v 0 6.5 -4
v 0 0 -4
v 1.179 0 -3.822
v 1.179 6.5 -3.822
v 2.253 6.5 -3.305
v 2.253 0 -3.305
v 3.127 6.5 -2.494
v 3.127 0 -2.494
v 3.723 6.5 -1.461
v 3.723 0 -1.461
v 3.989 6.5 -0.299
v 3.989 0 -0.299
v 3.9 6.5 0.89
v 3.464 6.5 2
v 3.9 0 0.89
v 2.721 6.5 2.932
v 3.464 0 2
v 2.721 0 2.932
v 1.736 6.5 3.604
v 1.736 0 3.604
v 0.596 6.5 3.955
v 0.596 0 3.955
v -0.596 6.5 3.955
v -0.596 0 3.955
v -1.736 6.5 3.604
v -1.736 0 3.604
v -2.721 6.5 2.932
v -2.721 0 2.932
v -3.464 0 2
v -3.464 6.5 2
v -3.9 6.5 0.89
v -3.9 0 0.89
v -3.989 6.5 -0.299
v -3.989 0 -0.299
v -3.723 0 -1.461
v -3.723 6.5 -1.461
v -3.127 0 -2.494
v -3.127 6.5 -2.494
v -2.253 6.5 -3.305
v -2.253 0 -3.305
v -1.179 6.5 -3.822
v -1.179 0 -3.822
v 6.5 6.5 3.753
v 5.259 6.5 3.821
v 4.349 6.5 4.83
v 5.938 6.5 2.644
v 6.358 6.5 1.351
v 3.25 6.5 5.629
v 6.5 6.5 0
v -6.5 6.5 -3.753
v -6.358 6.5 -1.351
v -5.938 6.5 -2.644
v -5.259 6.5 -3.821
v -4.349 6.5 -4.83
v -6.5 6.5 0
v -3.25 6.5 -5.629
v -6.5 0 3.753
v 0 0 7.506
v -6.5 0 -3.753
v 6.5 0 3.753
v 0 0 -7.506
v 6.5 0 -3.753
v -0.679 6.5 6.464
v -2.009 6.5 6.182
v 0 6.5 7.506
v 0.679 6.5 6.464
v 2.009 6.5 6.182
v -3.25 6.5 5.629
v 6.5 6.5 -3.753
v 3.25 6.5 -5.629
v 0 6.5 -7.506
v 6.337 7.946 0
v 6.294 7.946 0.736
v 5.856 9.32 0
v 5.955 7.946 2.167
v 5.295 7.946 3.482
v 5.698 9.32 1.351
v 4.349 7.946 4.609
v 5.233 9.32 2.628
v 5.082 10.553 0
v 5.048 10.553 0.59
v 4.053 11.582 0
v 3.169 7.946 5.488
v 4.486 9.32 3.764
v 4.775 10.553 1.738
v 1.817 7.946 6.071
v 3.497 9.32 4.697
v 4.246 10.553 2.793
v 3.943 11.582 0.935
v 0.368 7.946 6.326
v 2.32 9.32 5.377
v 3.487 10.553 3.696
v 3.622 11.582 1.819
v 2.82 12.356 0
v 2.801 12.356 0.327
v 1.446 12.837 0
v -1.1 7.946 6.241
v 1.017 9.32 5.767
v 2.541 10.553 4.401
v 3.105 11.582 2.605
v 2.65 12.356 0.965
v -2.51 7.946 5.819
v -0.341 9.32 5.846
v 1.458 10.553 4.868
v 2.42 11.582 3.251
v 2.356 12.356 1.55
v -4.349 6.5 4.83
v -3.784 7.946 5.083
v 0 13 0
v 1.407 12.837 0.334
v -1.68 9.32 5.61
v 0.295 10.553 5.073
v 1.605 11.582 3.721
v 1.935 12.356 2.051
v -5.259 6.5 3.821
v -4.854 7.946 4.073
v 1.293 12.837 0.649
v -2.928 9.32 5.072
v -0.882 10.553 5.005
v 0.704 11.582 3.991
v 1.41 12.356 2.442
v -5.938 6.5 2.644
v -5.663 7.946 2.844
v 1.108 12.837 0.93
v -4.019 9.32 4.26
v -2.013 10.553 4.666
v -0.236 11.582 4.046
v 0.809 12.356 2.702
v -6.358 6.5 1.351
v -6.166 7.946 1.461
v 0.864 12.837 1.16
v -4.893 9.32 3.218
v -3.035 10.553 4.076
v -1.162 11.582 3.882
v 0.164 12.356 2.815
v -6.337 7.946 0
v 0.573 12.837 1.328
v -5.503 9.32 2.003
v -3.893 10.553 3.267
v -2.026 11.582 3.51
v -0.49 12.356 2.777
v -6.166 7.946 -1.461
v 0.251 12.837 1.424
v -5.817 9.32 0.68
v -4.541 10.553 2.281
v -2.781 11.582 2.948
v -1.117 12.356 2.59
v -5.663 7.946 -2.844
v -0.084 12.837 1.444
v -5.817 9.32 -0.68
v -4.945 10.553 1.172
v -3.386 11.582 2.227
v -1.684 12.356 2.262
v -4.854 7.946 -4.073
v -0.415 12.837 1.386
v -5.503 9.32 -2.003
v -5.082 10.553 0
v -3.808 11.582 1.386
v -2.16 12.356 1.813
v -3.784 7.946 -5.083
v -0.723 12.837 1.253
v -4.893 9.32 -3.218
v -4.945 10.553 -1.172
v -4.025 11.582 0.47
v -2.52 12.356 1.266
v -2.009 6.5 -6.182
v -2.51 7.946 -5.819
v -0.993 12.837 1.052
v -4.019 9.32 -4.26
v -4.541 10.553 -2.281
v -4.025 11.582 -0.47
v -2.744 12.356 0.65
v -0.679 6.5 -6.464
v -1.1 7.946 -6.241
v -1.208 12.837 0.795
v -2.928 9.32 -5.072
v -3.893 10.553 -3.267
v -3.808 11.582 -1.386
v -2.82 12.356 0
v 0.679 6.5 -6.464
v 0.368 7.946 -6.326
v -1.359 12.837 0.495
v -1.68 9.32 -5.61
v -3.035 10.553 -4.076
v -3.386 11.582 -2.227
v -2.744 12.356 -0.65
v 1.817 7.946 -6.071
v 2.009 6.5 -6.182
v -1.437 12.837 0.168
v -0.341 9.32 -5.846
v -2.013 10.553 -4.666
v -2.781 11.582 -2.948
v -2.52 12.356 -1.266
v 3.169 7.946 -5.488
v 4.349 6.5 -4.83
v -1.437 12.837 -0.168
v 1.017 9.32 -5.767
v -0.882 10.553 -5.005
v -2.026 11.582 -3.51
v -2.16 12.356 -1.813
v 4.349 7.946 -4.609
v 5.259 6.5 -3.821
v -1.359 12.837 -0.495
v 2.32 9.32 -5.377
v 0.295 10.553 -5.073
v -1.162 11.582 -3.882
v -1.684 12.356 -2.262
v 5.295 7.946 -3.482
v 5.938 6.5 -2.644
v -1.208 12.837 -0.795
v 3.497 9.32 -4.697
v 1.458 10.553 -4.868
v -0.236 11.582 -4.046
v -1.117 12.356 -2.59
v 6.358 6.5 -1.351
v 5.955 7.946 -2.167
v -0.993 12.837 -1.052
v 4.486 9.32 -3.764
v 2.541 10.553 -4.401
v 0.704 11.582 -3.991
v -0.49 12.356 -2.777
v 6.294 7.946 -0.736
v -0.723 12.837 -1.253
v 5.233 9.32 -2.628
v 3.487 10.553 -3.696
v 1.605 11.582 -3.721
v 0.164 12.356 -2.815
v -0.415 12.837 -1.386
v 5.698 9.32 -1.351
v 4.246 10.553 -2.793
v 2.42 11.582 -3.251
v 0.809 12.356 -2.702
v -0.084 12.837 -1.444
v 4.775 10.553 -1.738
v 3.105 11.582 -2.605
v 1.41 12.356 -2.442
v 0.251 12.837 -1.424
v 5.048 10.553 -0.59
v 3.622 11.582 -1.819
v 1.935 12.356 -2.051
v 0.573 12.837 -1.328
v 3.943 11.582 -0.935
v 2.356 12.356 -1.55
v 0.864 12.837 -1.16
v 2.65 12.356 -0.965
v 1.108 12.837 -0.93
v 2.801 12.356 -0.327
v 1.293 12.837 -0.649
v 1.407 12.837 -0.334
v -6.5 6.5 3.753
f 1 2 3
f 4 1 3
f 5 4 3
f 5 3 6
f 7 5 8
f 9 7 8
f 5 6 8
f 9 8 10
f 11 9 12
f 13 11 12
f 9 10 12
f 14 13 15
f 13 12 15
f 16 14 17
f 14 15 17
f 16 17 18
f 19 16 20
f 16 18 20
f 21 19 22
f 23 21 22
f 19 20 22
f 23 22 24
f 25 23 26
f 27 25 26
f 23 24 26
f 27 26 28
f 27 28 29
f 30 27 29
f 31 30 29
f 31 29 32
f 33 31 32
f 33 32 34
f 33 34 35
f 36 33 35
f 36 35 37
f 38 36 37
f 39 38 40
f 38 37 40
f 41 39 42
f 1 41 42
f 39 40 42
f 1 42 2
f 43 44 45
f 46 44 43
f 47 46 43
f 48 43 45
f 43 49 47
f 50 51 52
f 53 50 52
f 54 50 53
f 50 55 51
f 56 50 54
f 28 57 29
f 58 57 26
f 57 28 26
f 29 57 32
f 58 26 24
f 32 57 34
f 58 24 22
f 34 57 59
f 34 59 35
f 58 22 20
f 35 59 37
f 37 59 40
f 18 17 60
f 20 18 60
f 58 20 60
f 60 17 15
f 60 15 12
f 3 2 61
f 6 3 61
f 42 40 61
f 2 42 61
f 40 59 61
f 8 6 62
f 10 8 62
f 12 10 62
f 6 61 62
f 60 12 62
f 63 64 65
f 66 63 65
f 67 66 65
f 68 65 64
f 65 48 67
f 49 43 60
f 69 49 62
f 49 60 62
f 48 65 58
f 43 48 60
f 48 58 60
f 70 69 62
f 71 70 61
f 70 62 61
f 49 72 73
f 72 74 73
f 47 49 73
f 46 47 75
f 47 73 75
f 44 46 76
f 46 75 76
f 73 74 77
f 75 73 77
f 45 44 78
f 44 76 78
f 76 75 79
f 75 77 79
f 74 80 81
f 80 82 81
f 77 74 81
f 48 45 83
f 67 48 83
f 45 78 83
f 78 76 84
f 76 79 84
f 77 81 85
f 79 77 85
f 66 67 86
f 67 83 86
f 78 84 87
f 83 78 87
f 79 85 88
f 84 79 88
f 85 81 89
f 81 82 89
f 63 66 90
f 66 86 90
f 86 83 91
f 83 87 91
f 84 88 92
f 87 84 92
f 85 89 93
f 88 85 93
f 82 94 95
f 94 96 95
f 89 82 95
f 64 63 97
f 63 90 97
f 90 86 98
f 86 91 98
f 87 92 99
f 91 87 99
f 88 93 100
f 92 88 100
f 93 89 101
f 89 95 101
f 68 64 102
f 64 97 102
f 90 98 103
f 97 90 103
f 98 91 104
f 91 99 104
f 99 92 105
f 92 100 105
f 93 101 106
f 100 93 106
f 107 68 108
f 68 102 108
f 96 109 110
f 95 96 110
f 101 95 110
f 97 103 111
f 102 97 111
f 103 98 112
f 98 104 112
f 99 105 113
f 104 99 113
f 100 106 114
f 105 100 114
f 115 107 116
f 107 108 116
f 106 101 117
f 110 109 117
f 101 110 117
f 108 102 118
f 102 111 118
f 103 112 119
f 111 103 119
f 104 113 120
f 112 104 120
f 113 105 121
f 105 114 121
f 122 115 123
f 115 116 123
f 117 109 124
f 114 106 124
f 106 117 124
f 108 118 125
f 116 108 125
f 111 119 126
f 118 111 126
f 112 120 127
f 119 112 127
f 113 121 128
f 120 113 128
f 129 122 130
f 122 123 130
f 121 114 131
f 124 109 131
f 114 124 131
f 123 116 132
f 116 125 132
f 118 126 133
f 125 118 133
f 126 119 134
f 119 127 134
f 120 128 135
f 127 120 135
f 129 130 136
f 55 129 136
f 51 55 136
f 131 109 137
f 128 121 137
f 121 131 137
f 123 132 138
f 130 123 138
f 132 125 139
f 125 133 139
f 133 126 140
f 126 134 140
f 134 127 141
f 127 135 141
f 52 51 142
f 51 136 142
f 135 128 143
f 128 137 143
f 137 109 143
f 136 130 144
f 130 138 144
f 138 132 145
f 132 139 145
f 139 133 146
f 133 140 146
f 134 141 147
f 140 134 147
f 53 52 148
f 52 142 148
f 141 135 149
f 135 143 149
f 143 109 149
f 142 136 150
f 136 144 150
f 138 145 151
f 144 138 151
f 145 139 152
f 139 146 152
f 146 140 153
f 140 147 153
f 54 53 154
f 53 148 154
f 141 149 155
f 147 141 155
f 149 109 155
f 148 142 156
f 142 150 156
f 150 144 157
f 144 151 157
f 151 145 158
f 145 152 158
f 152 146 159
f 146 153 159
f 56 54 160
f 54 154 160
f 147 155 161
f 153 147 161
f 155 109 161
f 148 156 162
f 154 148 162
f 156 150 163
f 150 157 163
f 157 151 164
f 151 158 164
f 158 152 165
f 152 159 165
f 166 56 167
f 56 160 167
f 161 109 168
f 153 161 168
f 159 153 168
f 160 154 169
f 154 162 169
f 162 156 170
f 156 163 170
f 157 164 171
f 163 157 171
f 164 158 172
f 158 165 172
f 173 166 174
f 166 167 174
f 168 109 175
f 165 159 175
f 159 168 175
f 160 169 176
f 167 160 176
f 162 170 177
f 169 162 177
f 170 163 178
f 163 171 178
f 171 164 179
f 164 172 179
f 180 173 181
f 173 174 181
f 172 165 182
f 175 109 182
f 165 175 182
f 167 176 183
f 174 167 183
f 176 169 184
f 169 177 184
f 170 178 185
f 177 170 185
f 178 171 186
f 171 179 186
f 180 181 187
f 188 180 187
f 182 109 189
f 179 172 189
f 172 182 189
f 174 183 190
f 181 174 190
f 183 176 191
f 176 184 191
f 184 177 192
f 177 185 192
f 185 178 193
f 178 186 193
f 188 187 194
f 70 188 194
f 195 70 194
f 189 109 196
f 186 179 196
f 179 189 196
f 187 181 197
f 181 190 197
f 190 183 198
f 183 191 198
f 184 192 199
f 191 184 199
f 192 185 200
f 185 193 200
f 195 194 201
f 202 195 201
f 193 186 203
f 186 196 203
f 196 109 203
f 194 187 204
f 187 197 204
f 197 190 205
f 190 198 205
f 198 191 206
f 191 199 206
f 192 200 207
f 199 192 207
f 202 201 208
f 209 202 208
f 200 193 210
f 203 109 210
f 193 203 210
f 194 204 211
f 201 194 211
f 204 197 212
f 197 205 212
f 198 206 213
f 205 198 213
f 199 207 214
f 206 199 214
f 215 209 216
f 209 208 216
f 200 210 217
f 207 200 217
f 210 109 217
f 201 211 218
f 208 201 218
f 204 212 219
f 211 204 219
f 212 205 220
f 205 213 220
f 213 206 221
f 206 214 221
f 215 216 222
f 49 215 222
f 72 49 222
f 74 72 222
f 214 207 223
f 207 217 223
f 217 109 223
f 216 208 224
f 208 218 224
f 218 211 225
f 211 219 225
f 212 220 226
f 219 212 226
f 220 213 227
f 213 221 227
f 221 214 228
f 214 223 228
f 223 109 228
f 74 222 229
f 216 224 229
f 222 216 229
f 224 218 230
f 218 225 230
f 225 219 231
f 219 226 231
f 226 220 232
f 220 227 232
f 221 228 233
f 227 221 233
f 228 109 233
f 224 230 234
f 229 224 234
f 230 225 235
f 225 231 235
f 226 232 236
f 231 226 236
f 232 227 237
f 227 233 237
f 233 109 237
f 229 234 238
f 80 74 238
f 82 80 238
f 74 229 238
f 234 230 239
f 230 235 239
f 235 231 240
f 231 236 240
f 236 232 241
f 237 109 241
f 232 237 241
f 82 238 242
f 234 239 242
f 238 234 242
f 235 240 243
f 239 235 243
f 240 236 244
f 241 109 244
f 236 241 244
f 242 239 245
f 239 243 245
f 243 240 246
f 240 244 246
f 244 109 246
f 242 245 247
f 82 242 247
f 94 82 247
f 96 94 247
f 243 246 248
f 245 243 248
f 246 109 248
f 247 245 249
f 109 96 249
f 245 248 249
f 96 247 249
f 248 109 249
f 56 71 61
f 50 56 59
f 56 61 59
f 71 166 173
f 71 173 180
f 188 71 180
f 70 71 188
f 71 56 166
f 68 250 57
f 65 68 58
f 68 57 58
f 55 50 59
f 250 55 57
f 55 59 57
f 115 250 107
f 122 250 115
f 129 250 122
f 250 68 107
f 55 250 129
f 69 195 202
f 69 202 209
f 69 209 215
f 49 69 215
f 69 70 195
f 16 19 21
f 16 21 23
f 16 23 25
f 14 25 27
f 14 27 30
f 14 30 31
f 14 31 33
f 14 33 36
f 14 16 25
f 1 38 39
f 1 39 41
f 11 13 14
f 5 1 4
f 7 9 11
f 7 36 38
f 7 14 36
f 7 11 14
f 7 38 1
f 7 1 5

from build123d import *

# Parameters (mm, degrees)
EXTRUDE_1_DEPTH     = 6.5
SKETCH_6_R          = 4
CUT_EXTRUDE_1_DEPTH = 6.5


with BuildPart() as part:
    # ｽｹｯﾁ1 → ﾎﾞｽ - 押し出し1 (new body)
    with BuildSketch(Plane(origin=(0, 0, 0), x_dir=(1, 0, 0), z_dir=(0, 1, 0))):
        Polygon((0, -7.505553499), (6.5, -3.75277675), (6.5, 3.75277675), (0, 7.505553499), (-6.5, 3.75277675), (-6.5, -3.75277675), align=None)
    extrude(amount=EXTRUDE_1_DEPTH)

    # ｽｹｯﾁ5 → 回転1 (revolve)
    with BuildSketch(Plane.XY):
        with BuildLine():
            Line((0, 13), (0, 6.5))
            Line((0, 6.5), (6.5, 6.5))
            ThreePointArc((6.5, 6.5), (4.596194078, 11.096194078), (0, 13))
        make_face()
    revolve(axis=Axis((0, 13, 0), (0, -1, 0)))

    # ｽｹｯﾁ6 → ｶｯﾄ - 押し出し1 (cut)
    with BuildSketch(Plane.XZ):
        with Locations(Location((0, 0, 0), (0, 0, 270))):
            Circle(SKETCH_6_R)
    extrude(amount=-CUT_EXTRUDE_1_DEPTH, mode=Mode.SUBTRACT)


solid = part.part
